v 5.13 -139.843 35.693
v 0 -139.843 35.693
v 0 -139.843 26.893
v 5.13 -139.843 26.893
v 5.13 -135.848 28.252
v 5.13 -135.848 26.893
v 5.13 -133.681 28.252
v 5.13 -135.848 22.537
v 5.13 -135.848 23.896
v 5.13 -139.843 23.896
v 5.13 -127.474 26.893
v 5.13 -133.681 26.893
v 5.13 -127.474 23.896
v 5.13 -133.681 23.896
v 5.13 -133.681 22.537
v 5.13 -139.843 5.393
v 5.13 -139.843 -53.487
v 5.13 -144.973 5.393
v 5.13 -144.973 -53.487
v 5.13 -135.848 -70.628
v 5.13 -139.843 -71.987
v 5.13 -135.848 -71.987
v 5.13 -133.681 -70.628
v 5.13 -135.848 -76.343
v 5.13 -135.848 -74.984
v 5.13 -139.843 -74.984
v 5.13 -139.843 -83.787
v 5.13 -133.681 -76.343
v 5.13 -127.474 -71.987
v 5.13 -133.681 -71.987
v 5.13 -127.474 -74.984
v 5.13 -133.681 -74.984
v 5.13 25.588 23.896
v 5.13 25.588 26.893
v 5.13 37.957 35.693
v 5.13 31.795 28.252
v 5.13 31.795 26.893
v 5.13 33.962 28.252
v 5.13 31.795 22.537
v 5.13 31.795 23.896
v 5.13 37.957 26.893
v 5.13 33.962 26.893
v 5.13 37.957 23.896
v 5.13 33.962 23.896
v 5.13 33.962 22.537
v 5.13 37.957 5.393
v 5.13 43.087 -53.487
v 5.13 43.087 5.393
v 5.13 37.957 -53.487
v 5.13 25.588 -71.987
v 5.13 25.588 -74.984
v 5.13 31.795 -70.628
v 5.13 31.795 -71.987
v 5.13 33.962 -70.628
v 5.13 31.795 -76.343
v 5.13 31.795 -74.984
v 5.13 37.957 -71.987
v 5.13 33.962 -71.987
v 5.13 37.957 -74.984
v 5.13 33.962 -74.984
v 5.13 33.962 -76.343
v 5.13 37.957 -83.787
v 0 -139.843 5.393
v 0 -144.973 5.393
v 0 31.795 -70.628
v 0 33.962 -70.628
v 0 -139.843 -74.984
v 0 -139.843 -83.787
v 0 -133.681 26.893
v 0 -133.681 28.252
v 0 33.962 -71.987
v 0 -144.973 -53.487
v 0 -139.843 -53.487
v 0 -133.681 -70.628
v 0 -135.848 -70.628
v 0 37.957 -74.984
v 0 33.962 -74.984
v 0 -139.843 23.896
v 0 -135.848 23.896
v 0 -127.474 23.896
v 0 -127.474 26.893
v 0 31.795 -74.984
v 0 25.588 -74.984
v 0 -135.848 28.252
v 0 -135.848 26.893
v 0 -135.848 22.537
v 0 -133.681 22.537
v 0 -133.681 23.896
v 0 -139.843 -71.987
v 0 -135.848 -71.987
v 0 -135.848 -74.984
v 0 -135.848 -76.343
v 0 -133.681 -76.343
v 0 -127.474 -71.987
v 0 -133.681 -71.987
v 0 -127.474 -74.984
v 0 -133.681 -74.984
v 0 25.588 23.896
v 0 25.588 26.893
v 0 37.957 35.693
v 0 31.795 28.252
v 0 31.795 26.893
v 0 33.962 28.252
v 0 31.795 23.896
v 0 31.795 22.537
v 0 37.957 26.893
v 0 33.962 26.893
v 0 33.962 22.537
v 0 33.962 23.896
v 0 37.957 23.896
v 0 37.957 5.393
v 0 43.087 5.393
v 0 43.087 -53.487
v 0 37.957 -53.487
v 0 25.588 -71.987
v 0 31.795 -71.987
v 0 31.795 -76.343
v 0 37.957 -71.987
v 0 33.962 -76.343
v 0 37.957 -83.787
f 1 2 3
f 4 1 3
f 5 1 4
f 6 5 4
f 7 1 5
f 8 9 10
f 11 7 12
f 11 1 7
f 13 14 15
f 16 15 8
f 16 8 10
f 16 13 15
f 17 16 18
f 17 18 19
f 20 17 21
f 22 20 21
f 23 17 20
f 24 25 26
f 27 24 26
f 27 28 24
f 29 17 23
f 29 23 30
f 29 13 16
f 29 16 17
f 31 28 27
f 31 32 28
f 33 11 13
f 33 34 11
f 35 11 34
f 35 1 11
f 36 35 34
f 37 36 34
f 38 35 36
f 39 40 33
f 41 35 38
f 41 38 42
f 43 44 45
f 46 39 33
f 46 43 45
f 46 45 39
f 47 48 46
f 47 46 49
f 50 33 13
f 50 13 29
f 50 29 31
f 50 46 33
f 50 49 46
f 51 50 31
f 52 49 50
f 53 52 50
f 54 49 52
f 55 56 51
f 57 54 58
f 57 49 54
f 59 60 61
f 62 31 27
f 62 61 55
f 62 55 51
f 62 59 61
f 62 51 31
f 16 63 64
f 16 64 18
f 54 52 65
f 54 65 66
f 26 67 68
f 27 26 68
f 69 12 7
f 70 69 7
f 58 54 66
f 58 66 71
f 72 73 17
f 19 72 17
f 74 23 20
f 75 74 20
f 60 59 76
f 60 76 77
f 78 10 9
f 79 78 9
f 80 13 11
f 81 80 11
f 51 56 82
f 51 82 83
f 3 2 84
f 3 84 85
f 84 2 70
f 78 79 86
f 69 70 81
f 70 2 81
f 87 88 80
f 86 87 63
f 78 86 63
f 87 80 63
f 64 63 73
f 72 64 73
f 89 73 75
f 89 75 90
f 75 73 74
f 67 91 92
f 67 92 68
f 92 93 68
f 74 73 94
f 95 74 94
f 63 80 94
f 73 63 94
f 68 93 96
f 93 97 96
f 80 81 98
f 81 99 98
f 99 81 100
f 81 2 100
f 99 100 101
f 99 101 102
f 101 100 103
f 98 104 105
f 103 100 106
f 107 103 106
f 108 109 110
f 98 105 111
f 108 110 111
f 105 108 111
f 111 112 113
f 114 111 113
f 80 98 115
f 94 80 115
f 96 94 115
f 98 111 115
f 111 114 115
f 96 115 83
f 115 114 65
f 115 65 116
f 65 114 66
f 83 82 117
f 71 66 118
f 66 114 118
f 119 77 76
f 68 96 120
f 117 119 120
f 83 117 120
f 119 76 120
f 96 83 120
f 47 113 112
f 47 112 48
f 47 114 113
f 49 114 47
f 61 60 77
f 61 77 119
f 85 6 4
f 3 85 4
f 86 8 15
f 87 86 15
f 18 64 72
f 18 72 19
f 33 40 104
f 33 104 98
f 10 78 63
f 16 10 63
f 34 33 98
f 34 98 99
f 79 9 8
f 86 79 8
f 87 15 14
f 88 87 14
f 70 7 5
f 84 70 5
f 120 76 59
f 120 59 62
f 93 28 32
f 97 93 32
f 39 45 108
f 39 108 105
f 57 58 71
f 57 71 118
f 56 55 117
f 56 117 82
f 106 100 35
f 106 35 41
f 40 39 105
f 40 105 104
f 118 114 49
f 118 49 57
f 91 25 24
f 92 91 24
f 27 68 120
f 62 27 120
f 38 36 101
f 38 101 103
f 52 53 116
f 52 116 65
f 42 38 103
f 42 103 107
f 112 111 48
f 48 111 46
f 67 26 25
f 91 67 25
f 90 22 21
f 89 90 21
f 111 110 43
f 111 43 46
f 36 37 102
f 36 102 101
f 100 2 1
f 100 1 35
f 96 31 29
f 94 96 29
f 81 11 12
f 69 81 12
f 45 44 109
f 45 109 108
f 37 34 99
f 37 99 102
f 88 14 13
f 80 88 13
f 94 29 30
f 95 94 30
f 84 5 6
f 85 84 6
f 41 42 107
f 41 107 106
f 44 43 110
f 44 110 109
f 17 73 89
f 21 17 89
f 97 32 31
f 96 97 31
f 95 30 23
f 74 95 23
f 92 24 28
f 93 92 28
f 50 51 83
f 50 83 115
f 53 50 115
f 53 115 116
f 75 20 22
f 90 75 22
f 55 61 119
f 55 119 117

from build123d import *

# Parameters (mm, degrees)
SKETCH1_W           = 119.48
SKETCH1_H           = 177.8
BOSS_EXTRUDE1_DEPTH = 5.13
CUT_EXTRUDE1_DEPTH  = 5.13
SKETCH5_W           = 5.13
SKETCH5_H           = 58.88
BOSS_EXTRUDE2_DEPTH = 5.13
SKETCH8_W           = 5.13
SKETCH8_H           = 58.88
BOSS_EXTRUDE3_DEPTH = 5.13


with BuildPart() as part:
    # Sketch1 → Boss-Extrude1 (new body)
    with BuildSketch(Plane(origin=(0, 0, 0), x_dir=(0, 0, -1), z_dir=(1, 0, 0))):
        with Locations((24.047197546, -50.943101868)):
            Rectangle(SKETCH1_W, SKETCH1_H)
    extrude(amount=BOSS_EXTRUDE1_DEPTH)

    # Sketch2 → Cut-Extrude1 (cut)
    with BuildSketch(Plane(origin=(5.13, 0, 0), x_dir=(0, 0, -1), z_dir=(1, 0, 0))):
        Polygon((-26.892802454, 37.956898132), (-23.895802454, 37.956898132), (-23.895802454, 33.961898132), (-22.536802454, 33.961898132), (-22.536802454, 31.794898132), (-23.895802454, 31.794898132), (-23.895802454, 25.587898132), (-26.892802454, 25.587898132), (-26.892802454, 31.794898132), (-28.251802454, 31.794898132), (-28.251802454, 33.961898132), (-26.892802454, 33.961898132), align=None)
        Polygon((71.987197546, 33.961898132), (71.987197546, 37.956898132), (74.984197546, 37.956898132), (74.984197546, 33.961898132), (76.343197546, 33.961898132), (76.343197546, 31.794898132), (74.984197546, 31.794898132), (74.984197546, 25.587898132), (71.987197546, 25.587898132), (71.987197546, 31.794898132), (70.628197546, 31.794898132), (70.628197546, 33.961898132), align=None)
        Polygon((76.343197546, -133.681101868), (74.984197546, -133.681101868), (74.984197546, -127.474101868), (71.987197546, -127.474101868), (71.987197546, -133.681101868), (70.628197546, -133.681101868), (70.628197546, -135.848101868), (71.987197546, -135.848101868), (71.987197546, -139.843101868), (74.984197546, -139.843101868), (74.984197546, -135.848101868), (76.343197546, -135.848101868), align=None)
        Polygon((-26.892802454, -139.843101868), (-23.895802454, -139.843101868), (-23.895802454, -135.848101868), (-22.536802454, -135.848101868), (-22.536802454, -133.681101868), (-23.895802454, -133.681101868), (-23.895802454, -127.474101868), (-26.892802454, -127.474101868), (-26.892802454, -133.681101868), (-28.251802454, -133.681101868), (-28.251802454, -135.848101868), (-26.892802454, -135.848101868), align=None)
    extrude(amount=-CUT_EXTRUDE1_DEPTH, mode=Mode.SUBTRACT)

    # Sketch5 → Boss-Extrude2 (add)
    with BuildSketch(Plane(origin=(0, 37.956898132, 0), x_dir=(1, 0, 0), z_dir=(0, 1, 0))):
        with Locations((2.565, 24.047197546)):
            Rectangle(SKETCH5_W, SKETCH5_H)
    extrude(amount=BOSS_EXTRUDE2_DEPTH)

    # Sketch8 → Boss-Extrude3 (add)
    with BuildSketch(Plane.XZ.offset(139.843101868)):
        with Locations((2.565, -24.047197546)):
            Rectangle(SKETCH8_W, SKETCH8_H)
    extrude(amount=BOSS_EXTRUDE3_DEPTH)


solid = part.part
